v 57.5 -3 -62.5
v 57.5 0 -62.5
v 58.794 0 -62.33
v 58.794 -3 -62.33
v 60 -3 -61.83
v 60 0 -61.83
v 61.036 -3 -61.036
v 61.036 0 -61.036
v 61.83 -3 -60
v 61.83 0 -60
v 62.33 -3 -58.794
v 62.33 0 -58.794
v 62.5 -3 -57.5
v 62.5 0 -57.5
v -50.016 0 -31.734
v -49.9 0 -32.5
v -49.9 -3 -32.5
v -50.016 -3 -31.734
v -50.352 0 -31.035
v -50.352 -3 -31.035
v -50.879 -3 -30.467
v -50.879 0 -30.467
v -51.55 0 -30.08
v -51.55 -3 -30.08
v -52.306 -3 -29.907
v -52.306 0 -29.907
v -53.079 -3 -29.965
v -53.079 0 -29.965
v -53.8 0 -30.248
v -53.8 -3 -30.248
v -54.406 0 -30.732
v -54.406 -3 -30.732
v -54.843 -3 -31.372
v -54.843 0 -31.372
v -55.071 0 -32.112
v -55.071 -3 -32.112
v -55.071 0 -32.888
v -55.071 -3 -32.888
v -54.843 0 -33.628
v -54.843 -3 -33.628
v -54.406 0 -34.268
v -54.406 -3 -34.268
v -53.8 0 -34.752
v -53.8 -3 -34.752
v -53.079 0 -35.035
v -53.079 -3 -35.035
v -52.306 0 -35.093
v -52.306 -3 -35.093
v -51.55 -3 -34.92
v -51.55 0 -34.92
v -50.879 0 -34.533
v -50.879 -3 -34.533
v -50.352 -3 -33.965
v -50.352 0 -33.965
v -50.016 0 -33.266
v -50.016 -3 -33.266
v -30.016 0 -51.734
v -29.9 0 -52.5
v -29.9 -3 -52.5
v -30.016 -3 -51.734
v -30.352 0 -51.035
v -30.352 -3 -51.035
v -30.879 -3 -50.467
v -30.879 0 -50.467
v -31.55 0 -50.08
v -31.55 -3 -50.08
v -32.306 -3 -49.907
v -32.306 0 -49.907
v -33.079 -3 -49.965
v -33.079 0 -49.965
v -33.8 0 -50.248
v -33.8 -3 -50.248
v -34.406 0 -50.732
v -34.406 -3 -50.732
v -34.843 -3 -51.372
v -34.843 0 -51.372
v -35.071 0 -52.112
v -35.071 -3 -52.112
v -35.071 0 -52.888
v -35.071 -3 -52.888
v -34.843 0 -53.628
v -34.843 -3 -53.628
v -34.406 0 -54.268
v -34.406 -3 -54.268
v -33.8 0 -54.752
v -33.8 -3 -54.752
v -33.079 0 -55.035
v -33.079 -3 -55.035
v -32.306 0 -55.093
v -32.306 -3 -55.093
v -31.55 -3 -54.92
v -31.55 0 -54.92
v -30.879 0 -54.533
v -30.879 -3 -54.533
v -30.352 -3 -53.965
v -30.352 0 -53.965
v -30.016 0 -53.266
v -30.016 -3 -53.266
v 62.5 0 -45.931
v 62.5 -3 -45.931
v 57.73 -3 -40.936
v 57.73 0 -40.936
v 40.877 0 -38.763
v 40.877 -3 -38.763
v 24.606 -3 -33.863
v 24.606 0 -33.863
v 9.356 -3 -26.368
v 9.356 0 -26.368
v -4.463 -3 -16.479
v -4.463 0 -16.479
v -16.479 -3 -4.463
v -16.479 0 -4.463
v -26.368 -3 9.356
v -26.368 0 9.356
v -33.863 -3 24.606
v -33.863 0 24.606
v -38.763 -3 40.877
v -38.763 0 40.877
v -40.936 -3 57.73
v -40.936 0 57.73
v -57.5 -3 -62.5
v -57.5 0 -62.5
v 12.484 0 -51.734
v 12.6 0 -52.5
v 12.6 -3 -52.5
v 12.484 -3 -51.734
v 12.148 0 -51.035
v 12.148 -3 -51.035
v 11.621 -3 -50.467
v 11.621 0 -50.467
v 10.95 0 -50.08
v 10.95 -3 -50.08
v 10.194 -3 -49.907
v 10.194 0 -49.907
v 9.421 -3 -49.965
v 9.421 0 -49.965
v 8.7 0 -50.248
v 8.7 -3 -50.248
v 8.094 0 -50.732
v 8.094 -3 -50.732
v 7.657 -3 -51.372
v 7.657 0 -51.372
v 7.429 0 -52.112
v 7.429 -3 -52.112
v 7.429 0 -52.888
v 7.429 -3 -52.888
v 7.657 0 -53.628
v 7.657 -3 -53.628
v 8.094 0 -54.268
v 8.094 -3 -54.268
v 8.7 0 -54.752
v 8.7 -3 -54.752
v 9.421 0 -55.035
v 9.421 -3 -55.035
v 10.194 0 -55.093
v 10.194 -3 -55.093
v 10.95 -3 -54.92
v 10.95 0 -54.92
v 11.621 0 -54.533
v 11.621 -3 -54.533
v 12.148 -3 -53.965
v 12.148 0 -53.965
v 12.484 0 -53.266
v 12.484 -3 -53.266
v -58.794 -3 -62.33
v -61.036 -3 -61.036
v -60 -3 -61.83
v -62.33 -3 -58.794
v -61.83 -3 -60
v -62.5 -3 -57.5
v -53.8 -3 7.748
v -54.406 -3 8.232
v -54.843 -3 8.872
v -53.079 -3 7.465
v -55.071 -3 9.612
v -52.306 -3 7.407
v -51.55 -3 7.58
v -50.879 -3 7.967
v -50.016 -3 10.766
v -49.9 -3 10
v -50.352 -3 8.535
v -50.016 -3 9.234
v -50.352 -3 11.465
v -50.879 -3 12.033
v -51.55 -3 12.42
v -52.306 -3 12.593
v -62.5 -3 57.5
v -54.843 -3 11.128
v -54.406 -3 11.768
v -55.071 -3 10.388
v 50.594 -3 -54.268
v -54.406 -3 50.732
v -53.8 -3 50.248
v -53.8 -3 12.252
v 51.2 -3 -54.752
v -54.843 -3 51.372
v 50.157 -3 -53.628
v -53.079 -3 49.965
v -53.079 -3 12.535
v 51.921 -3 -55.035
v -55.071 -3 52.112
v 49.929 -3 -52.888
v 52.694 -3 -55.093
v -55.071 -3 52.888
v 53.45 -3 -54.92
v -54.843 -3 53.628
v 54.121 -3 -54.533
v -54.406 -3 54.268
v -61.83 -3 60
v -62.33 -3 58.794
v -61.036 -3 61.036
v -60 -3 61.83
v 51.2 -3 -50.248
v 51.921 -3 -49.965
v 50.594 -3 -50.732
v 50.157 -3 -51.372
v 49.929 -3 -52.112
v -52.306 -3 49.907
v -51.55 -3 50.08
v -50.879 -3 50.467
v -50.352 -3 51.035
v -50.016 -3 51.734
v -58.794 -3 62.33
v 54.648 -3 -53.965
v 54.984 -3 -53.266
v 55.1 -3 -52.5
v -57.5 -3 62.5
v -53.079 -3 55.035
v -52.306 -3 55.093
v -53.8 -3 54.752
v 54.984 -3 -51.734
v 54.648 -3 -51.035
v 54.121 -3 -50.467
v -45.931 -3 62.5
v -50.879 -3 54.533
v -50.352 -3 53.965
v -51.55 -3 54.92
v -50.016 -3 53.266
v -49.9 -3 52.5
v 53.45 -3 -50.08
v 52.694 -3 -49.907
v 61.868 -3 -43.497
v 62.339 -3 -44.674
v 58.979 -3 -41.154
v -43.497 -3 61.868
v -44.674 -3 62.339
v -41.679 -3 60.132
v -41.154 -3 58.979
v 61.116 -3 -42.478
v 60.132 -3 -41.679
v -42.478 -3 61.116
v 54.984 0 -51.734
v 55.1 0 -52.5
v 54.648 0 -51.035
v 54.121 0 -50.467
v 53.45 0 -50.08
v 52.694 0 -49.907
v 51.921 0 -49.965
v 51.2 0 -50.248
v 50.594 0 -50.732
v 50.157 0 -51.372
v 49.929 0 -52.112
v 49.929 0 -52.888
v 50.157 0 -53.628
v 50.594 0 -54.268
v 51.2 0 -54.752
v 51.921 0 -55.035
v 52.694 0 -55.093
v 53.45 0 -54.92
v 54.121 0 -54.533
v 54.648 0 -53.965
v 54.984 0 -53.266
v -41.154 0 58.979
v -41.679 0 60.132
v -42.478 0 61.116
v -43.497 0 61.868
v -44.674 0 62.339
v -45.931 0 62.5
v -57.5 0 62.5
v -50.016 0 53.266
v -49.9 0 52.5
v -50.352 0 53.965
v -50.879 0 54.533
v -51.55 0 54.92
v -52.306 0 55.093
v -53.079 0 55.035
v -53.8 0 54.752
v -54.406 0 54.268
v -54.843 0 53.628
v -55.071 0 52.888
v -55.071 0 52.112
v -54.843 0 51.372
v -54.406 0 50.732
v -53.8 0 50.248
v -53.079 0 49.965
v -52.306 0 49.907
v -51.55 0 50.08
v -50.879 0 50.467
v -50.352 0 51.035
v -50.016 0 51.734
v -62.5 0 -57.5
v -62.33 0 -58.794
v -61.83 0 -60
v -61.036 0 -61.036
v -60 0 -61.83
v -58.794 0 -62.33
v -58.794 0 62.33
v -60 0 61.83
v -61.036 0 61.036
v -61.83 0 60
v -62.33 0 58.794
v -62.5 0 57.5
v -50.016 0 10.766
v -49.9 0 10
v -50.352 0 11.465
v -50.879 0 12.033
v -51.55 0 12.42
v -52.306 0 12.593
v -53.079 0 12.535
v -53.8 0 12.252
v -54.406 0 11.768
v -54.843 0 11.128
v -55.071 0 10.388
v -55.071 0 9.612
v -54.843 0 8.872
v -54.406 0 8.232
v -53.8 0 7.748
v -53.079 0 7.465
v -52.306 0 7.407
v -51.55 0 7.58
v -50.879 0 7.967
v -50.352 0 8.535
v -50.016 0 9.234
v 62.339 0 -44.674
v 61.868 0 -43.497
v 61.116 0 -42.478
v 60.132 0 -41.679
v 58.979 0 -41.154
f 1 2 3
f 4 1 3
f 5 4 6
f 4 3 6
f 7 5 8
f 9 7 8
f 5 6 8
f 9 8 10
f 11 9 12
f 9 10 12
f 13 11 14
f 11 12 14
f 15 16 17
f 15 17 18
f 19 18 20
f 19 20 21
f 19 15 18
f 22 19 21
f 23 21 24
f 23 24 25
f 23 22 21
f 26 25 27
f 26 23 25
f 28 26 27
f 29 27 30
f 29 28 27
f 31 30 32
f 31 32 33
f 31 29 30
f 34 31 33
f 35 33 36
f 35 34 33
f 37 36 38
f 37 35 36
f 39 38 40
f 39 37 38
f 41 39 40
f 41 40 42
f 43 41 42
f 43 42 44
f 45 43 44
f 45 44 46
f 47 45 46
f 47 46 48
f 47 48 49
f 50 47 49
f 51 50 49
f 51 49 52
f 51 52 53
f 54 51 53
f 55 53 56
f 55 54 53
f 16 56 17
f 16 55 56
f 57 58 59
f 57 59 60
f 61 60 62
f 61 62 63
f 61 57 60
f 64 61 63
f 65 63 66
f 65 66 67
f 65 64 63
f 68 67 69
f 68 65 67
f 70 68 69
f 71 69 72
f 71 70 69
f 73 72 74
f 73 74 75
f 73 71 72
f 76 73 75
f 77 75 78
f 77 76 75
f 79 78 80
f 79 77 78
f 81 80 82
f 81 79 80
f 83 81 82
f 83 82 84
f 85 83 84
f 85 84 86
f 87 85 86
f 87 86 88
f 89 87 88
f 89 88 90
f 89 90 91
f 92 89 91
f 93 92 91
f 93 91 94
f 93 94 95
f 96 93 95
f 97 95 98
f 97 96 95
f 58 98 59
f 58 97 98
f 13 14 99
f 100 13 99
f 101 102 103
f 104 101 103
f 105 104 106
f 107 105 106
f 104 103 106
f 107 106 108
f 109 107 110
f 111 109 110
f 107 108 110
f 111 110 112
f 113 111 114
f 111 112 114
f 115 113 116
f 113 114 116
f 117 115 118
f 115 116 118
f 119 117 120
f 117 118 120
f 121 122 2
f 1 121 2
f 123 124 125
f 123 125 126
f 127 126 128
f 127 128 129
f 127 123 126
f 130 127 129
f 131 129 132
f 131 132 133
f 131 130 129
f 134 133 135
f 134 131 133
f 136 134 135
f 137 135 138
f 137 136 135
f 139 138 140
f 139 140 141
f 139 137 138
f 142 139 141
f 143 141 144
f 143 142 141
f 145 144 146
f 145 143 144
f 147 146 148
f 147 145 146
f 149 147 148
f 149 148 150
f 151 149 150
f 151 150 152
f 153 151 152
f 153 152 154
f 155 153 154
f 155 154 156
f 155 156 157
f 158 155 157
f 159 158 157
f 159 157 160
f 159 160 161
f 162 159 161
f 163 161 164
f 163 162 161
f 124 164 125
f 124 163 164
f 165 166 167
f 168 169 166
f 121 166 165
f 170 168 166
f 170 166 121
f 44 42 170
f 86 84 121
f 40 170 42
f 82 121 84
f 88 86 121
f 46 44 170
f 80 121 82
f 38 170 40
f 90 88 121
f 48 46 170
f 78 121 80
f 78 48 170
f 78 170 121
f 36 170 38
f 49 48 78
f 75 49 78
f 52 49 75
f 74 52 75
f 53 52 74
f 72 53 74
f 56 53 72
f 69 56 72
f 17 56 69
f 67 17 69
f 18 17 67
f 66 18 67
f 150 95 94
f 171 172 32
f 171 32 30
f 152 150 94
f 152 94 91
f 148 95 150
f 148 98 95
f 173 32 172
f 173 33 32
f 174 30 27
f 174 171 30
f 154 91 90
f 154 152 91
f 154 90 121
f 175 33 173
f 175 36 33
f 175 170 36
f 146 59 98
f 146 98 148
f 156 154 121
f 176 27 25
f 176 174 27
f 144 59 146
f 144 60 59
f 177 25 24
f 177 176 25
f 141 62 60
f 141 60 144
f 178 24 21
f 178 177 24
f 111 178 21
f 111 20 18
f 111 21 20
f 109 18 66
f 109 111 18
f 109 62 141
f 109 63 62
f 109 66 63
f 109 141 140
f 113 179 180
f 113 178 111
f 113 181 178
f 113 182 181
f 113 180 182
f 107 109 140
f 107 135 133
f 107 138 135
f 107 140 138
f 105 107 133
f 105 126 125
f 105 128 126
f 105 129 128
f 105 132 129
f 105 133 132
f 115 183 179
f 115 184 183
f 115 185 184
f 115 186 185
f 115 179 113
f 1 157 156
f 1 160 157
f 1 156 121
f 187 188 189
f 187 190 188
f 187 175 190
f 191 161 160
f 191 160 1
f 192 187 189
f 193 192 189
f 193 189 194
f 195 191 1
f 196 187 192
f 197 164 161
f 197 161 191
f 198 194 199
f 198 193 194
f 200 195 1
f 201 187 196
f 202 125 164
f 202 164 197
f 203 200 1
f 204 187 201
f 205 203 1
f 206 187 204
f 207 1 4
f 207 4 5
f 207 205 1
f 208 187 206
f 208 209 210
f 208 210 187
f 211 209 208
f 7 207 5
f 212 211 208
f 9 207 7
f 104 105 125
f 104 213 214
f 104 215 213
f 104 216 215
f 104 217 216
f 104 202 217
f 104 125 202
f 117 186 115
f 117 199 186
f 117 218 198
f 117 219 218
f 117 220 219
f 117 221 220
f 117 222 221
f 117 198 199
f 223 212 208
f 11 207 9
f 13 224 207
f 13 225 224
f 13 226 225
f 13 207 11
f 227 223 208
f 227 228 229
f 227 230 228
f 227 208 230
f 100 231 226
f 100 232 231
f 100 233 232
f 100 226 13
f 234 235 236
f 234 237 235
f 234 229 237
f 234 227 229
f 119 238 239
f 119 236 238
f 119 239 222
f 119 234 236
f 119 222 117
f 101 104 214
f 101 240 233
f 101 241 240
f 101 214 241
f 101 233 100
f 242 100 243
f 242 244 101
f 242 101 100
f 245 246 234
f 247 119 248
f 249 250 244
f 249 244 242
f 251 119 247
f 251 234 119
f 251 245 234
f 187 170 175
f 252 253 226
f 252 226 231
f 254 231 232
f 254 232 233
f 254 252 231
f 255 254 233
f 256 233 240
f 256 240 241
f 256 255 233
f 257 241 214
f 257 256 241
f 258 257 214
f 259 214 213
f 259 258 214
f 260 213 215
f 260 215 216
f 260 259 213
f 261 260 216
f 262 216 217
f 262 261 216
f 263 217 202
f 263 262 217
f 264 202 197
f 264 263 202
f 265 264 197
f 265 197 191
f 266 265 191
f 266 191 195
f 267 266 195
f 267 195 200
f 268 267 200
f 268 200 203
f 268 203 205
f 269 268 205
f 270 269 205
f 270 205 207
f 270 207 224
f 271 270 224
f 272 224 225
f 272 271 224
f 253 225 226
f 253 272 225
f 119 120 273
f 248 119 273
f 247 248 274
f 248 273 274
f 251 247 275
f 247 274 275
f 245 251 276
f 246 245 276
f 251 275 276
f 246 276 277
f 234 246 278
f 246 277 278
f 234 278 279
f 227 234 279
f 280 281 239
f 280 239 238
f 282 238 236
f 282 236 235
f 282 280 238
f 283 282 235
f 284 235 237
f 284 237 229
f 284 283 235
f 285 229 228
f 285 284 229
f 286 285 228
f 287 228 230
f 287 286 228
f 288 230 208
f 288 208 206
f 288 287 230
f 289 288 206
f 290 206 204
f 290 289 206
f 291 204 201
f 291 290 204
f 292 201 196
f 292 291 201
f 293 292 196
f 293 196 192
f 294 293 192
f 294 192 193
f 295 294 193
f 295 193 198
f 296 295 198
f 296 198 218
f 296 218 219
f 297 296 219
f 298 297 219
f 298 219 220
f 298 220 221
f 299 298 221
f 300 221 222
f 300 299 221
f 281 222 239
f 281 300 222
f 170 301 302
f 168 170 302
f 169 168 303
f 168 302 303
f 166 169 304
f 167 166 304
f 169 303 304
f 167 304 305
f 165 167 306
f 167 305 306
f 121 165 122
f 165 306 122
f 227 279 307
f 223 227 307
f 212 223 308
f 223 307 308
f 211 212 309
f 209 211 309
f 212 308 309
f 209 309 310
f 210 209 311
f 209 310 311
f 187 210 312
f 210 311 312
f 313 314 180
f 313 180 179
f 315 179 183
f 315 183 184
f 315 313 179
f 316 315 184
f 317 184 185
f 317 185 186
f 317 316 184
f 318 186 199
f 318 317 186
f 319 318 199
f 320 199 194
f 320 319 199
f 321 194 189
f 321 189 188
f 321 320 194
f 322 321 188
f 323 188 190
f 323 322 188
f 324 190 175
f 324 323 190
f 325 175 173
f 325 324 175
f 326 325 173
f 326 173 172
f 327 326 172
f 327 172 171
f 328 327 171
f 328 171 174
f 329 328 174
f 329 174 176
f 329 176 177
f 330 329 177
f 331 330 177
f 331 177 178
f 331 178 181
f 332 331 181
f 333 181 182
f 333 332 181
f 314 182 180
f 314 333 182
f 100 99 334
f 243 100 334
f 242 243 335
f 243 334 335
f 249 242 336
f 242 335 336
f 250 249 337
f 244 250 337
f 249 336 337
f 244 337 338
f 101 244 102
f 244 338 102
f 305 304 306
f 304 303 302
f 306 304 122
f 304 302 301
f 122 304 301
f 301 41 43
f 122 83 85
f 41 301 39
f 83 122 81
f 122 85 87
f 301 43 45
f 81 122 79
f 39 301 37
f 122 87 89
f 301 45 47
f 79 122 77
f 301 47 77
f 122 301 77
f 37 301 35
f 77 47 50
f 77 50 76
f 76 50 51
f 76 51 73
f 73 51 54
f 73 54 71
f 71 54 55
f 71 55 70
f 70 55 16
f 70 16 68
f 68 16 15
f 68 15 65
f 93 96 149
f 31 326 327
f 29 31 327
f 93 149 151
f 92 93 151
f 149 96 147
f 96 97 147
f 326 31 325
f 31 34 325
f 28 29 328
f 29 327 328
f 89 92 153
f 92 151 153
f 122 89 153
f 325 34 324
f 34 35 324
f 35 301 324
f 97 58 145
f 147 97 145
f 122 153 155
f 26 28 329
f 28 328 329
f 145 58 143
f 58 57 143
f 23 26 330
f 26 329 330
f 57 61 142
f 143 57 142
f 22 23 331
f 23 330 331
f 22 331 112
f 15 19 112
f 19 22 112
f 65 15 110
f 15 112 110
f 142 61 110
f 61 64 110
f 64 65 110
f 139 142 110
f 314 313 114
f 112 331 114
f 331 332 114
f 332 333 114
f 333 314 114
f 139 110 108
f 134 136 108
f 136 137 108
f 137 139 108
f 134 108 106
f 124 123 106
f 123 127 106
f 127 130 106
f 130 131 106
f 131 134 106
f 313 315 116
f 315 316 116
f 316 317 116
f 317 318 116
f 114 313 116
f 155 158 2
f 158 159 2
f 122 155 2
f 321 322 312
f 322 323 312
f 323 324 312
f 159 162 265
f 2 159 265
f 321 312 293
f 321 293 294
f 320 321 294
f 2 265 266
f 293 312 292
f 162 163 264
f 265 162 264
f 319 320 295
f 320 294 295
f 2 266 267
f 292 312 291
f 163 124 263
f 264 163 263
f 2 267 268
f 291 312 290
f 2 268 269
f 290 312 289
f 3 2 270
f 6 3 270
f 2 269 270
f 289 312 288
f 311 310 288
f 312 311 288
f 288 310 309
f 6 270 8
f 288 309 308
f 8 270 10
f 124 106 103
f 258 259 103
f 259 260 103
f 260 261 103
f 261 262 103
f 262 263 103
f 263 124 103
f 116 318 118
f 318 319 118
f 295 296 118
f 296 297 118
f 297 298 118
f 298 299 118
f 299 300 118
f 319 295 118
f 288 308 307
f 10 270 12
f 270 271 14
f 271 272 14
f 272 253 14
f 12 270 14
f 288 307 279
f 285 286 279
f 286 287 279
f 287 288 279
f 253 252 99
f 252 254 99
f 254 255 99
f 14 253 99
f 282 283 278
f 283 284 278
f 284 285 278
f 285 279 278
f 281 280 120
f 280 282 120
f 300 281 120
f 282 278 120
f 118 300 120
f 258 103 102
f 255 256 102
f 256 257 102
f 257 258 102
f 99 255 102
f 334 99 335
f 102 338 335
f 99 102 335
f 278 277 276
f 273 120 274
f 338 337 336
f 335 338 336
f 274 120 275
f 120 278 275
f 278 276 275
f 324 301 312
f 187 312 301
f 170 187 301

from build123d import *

# Parameters (mm, degrees)
F0_R     = 2.6
F1_DEPTH = 3


with BuildPart() as f1:
    # F0 (on Front) → F1 (new body)
    with BuildSketch(Plane.XZ):
        with BuildLine():
            Line((-57.5, -62.5), (57.5, -62.5))
            ThreePointArc((57.5, -62.5), (61.035534, -61.035534), (62.5, -57.5))
            Line((62.5, -57.5), (62.5, -45.930671))
            ThreePointArc((62.5, -45.930671), (61.116047, -42.477526), (57.730317, -40.935978))
            ThreePointArc((57.730317, -40.935978), (-10.718001, -10.718001), (-40.935978, 57.730317))
            ThreePointArc((-40.935978, 57.730317), (-42.477526, 61.116047), (-45.930671, 62.5))
            Line((-45.930671, 62.5), (-57.5, 62.5))
            ThreePointArc((-57.5, 62.5), (-61.035534, 61.035534), (-62.5, 57.5))
            Line((-62.5, 57.5), (-62.5, -57.5))
            ThreePointArc((-62.5, -57.5), (-61.035534, -61.035534), (-57.5, -62.5))
        make_face()
        with Locations((-32.5, -52.5)):
            Circle(F0_R, mode=Mode.SUBTRACT)
        with Locations((-52.5, -32.5)):
            Circle(F0_R, mode=Mode.SUBTRACT)
        with Locations((10, -52.5)):
            Circle(F0_R, mode=Mode.SUBTRACT)
        with Locations((52.5, -52.5)):
            Circle(F0_R, mode=Mode.SUBTRACT)
        with Locations((-52.5, 10)):
            Circle(F0_R, mode=Mode.SUBTRACT)
        with Locations((-52.5, 52.5)):
            Circle(F0_R, mode=Mode.SUBTRACT)
    extrude(amount=F1_DEPTH)


solid = f1.part
